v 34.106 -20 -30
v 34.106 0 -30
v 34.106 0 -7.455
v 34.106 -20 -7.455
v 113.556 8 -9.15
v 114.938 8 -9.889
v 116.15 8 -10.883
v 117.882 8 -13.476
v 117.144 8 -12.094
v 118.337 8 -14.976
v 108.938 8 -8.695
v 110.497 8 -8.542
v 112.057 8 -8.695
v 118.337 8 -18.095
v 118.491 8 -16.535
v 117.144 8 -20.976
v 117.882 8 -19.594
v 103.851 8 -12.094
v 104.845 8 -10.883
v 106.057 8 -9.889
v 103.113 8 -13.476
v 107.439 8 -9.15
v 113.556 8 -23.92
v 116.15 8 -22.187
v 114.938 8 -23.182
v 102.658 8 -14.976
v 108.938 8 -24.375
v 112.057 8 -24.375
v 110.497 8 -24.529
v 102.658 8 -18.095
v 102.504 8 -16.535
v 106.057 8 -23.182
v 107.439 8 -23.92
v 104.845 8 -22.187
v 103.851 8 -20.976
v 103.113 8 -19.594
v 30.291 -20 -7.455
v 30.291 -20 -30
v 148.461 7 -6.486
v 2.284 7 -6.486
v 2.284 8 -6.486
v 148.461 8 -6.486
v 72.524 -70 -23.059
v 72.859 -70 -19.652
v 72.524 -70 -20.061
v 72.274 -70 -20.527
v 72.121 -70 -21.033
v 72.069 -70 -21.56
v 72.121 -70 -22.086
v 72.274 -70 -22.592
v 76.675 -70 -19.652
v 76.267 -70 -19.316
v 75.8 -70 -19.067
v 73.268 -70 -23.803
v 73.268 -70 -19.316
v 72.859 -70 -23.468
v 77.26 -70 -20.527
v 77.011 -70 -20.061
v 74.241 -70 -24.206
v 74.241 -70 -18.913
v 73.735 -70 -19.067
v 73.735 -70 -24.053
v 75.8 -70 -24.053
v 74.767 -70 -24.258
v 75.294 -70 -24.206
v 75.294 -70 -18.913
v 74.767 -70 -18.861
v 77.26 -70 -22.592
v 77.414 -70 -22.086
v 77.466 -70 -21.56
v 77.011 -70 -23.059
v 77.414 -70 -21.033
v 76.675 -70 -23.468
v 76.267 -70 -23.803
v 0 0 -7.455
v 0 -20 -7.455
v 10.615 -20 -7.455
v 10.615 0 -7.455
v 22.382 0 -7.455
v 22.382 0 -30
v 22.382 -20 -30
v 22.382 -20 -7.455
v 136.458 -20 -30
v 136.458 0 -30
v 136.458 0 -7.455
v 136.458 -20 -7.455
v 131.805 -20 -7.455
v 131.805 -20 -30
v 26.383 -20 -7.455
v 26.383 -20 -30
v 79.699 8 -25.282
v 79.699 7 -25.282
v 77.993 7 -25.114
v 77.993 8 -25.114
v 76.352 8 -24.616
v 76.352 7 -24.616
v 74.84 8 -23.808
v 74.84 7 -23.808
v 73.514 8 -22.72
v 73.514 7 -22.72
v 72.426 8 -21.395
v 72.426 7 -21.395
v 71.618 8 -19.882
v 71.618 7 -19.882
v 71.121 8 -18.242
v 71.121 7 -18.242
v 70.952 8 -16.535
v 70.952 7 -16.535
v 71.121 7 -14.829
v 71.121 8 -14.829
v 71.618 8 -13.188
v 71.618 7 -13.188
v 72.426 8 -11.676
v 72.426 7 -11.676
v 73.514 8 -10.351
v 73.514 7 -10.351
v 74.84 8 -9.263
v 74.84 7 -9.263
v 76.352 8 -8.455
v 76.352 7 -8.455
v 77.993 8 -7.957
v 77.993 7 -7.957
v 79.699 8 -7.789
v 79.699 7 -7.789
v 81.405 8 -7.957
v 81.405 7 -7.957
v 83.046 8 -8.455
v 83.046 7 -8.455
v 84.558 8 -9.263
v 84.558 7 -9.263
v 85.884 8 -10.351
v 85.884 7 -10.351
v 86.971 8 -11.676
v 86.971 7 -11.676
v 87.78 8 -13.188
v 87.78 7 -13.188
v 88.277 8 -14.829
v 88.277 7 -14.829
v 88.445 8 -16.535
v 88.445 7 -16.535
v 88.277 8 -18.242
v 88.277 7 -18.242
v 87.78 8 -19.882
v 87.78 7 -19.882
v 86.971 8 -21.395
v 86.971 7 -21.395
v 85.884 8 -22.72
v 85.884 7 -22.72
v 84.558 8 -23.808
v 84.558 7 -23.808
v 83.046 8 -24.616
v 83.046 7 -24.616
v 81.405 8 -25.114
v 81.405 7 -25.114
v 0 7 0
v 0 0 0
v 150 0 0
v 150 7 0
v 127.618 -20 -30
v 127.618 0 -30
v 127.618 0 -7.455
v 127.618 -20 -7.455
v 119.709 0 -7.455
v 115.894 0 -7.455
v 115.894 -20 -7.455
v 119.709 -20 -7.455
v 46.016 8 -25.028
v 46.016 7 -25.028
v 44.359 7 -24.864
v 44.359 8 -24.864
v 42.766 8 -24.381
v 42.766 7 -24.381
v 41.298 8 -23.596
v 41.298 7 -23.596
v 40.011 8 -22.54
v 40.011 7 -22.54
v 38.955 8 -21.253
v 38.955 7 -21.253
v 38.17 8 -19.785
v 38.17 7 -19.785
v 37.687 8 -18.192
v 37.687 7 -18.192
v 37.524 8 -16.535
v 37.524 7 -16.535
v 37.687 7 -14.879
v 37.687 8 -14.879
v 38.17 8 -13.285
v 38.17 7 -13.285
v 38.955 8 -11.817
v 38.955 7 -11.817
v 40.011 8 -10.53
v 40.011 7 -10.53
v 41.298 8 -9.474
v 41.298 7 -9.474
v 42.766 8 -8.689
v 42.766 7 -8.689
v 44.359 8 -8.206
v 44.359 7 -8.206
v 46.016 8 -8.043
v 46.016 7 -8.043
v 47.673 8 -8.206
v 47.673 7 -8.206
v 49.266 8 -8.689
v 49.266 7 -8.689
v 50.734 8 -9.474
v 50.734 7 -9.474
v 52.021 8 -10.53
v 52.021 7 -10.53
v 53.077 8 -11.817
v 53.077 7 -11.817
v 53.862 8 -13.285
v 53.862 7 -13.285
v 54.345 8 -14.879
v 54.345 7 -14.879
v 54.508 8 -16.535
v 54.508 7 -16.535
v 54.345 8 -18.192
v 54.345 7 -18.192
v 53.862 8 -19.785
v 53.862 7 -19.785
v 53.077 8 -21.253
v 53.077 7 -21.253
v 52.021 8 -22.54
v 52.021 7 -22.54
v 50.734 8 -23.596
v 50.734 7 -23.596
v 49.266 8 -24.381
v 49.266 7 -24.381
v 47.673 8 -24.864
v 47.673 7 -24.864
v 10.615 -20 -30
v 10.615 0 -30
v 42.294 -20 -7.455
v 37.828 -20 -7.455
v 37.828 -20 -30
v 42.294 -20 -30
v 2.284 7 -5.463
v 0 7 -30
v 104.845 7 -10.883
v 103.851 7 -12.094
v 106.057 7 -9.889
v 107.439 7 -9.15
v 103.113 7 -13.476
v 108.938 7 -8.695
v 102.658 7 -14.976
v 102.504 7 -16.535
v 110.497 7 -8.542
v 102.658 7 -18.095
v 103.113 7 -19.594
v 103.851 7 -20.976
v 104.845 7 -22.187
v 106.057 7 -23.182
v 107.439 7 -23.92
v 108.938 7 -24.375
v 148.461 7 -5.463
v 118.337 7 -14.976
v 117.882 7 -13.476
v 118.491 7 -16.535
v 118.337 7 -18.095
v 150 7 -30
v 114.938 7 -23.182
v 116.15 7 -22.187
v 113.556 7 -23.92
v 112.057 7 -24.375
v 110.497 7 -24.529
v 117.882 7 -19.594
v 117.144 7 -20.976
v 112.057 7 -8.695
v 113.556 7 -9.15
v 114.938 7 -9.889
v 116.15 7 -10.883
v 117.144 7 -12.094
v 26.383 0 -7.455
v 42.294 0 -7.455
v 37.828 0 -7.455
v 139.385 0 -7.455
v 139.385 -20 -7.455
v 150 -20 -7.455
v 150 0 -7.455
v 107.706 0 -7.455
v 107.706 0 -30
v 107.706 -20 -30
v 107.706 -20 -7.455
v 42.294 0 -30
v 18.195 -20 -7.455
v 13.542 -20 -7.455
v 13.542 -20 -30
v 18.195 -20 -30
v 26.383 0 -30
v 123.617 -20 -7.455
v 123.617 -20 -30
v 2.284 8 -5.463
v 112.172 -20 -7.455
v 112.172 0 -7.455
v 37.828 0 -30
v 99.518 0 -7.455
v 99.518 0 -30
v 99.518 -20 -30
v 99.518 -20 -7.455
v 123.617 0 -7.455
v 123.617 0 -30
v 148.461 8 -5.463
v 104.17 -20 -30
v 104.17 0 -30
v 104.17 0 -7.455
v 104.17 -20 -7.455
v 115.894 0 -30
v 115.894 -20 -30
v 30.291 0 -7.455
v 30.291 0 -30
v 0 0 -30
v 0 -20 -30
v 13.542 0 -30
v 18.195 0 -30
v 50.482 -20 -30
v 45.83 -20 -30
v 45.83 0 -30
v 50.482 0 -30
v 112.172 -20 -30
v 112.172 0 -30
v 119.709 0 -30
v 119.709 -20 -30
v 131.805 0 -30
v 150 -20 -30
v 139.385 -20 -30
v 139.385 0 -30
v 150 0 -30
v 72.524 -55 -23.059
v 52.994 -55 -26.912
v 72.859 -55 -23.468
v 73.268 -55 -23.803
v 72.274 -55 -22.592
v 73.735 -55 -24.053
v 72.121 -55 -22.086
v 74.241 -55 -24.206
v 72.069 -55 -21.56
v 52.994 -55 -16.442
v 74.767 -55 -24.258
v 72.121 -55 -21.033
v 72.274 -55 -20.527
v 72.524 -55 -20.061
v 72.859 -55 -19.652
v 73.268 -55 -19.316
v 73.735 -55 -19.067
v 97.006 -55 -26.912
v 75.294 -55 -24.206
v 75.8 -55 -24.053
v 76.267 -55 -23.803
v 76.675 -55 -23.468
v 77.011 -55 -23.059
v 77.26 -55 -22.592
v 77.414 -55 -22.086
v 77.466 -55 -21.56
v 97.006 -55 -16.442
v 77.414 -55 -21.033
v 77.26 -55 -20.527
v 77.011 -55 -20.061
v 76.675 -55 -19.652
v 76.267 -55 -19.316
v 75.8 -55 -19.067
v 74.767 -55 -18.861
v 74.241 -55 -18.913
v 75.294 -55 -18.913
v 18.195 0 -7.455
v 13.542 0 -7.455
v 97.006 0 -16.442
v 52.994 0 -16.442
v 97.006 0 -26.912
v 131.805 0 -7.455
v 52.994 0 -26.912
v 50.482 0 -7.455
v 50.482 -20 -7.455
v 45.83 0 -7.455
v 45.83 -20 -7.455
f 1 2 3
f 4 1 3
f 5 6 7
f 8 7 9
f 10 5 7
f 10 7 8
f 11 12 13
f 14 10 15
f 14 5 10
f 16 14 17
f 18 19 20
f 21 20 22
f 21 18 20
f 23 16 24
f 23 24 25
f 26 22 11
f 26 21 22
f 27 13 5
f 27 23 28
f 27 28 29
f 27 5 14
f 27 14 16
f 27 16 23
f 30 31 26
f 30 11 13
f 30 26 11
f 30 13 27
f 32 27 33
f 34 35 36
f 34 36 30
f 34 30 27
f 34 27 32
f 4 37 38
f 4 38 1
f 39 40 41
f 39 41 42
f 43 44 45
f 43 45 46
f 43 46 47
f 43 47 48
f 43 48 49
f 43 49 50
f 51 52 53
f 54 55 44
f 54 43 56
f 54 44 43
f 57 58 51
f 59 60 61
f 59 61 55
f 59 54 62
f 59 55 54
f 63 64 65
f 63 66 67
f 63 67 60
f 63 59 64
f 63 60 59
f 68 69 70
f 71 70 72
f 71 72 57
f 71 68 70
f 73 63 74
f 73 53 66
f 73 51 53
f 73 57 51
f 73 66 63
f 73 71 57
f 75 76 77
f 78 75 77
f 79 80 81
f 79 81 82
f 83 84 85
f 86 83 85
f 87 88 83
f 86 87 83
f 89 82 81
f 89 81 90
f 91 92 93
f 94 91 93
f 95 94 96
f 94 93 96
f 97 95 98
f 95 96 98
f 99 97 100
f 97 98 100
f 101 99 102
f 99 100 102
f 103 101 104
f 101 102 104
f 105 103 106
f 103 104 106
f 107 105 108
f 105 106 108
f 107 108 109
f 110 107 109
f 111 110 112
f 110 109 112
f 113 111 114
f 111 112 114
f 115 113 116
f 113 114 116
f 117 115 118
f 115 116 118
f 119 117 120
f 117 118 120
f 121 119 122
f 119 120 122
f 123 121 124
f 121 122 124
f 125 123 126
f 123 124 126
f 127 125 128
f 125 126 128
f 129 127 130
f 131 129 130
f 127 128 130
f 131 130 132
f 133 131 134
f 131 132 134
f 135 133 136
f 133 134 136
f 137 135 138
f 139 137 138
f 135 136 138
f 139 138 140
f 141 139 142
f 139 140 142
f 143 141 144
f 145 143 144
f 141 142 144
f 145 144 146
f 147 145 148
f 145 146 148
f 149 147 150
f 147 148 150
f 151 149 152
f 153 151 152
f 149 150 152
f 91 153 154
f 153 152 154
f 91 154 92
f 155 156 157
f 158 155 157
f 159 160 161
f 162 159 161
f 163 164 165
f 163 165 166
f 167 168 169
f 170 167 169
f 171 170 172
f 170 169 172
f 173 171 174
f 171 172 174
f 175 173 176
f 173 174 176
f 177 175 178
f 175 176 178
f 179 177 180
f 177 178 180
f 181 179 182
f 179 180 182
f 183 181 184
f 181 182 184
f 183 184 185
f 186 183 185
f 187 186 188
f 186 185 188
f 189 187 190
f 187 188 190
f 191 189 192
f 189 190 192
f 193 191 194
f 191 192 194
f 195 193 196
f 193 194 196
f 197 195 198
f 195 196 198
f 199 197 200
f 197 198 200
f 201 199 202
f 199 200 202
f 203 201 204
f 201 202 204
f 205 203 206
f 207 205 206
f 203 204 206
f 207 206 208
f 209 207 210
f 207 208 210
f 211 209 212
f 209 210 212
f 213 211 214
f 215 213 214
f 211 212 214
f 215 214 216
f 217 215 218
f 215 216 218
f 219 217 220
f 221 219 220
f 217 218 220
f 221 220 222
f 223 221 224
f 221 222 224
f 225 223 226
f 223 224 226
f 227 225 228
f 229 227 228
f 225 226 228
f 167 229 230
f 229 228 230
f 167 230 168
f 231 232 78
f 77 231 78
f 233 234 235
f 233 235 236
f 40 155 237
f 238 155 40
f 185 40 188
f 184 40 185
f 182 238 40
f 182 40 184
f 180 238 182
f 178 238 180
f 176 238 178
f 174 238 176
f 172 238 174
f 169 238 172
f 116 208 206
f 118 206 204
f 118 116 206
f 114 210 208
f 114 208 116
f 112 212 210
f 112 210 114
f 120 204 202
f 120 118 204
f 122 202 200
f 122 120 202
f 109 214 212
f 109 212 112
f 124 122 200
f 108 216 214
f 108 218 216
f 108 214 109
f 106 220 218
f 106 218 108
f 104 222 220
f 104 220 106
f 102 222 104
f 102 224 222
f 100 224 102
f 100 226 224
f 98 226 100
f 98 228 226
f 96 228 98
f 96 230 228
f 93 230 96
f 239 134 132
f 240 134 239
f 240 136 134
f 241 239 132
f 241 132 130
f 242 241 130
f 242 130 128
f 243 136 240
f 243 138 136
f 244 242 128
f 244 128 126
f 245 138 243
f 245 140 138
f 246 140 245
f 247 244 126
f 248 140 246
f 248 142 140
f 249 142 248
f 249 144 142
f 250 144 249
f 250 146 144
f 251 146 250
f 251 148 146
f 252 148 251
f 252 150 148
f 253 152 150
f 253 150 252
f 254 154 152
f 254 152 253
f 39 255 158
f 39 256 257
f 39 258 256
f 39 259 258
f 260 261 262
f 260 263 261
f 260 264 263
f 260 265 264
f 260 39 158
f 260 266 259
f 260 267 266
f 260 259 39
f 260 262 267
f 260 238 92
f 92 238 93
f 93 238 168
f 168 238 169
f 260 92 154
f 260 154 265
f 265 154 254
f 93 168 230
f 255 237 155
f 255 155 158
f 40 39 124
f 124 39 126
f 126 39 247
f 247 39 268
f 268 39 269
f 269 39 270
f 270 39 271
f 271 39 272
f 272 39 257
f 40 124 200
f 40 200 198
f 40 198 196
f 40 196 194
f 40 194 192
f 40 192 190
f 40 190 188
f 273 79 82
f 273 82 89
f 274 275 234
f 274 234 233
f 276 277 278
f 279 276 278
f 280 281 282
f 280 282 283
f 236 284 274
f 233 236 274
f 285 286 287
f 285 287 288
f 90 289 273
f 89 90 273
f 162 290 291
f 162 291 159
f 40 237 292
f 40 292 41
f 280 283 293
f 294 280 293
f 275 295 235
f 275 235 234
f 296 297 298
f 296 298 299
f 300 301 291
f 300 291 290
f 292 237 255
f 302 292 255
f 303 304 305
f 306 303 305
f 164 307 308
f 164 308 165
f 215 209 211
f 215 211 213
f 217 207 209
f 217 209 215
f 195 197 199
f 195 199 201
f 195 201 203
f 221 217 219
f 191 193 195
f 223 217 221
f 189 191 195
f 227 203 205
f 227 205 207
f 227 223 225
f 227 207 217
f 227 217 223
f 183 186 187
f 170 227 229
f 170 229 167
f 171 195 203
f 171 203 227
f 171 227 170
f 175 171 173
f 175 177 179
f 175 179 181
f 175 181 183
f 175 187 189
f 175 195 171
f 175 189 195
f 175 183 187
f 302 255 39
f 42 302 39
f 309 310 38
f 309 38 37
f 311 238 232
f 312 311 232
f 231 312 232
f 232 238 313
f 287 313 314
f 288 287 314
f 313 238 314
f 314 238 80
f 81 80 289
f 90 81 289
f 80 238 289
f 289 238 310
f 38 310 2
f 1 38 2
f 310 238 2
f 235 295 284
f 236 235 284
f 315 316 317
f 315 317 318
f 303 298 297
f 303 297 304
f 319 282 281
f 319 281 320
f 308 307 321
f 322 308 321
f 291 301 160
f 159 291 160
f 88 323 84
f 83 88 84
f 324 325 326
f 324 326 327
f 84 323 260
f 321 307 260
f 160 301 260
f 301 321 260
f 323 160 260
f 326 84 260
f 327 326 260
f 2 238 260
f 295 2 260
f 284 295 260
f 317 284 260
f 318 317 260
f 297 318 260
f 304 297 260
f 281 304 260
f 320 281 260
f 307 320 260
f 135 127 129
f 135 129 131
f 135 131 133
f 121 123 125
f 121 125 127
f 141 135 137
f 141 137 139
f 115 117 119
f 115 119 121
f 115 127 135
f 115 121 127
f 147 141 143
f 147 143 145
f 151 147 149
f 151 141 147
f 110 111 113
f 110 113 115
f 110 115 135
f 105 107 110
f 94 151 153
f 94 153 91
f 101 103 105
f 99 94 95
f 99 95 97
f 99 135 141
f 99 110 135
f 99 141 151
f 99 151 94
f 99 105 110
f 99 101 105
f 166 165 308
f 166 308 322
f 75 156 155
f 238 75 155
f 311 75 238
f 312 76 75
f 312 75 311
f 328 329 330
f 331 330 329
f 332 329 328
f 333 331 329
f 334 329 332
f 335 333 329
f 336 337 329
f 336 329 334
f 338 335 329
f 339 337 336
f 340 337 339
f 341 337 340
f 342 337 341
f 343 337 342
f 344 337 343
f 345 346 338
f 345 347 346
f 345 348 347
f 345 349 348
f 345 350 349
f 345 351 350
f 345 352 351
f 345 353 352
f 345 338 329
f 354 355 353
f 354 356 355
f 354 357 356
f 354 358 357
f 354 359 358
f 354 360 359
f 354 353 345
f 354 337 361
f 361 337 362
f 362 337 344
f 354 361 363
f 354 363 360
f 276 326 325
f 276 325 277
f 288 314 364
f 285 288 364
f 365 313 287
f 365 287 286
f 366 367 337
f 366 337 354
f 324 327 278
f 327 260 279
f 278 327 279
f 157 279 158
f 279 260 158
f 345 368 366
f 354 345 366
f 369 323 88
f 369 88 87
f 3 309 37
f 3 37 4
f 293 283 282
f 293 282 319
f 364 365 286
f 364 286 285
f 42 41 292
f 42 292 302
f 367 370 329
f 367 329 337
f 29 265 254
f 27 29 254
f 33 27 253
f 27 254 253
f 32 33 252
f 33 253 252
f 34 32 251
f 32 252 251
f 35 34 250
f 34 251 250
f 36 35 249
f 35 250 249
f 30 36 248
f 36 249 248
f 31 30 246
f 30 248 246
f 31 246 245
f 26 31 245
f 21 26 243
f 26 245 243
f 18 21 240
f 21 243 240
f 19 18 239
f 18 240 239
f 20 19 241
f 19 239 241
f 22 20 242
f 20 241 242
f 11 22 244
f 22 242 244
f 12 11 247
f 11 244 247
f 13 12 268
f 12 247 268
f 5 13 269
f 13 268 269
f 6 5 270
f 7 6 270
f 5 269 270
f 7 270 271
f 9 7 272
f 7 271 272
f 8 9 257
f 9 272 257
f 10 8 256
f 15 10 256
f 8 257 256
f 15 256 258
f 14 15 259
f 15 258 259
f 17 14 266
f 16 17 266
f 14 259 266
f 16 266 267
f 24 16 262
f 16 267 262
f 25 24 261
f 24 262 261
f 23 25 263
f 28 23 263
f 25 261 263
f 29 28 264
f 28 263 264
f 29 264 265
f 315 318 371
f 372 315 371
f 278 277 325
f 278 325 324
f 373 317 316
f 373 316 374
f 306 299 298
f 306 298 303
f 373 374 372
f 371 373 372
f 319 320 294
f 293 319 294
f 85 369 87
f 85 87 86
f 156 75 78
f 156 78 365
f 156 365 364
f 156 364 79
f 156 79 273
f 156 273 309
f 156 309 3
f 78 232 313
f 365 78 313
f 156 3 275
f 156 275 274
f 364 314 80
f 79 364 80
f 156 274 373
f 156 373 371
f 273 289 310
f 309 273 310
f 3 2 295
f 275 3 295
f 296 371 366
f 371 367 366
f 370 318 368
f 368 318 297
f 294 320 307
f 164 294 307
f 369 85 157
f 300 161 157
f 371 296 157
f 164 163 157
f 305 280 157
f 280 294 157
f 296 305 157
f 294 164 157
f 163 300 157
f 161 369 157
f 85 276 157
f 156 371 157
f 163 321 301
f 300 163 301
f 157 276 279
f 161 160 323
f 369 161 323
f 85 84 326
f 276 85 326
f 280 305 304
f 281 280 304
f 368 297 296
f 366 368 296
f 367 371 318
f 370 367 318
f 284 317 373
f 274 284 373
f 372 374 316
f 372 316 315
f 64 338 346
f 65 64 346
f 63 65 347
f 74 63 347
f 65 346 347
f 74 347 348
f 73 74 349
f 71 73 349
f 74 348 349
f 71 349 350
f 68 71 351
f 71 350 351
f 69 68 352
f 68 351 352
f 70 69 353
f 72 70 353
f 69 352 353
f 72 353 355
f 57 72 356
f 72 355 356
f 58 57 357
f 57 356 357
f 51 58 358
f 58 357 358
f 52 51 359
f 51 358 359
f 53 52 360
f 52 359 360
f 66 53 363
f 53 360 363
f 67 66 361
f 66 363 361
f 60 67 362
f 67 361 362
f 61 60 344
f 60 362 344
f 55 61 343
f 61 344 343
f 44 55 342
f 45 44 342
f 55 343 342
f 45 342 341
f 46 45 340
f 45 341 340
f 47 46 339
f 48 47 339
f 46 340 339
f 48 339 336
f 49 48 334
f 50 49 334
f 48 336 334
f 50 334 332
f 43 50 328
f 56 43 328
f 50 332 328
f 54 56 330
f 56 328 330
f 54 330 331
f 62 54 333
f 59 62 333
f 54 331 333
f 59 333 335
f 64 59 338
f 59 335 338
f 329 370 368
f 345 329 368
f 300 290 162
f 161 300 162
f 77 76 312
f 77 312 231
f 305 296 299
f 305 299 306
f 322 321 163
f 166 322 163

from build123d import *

# Parameters (mm, degrees)
SKETCH1_W           = 150
SKETCH1_H           = 30
BOSS_EXTRUDE1_DEPTH = 7
SKETCH2_R           = 8.492301233
SKETCH2_R_2         = 8.746428368
SKETCH2_R_3         = 7.993391254
SKETCH2_W           = 146.177010272
SKETCH2_H           = 1.023518213
BOSS_EXTRUDE2_DEPTH = 1
SKETCH3_W           = 10.614560987
SKETCH3_H           = 22.545060987
SKETCH3_W_2         = 4.652355514
SKETCH3_W_3         = 4.001025742
SKETCH3_W_4         = 3.814931522
SKETCH3_W_5         = 4.466261294
SKETCH3_W_6         = 4.652355515
BOSS_EXTRUDE3_DEPTH = 20
SKETCH4_W           = 44.01124784
SKETCH4_H           = 10.469759529
BOSS_EXTRUDE4_DEPTH = 55
SKETCH5_R           = 2.698367098
BOSS_EXTRUDE5_DEPTH = 15


with BuildPart() as part:
    # Sketch1 → Boss-Extrude1 (new body)
    with BuildSketch(Plane(origin=(0, 0, 0), x_dir=(1, 0, 0), z_dir=(0, 1, 0))):
        with Locations((75, 15)):
            Rectangle(SKETCH1_W, SKETCH1_H)
    extrude(amount=BOSS_EXTRUDE1_DEPTH)

    # Sketch2 → Boss-Extrude2 (add)
    with BuildSketch(Plane(origin=(0, 7, 0), x_dir=(1, 0, 0), z_dir=(0, 1, 0))):
        with Locations(Location((46.015825143, 16.53527732, 0), (0, 0, 90))):
            Circle(SKETCH2_R)
        with Locations(Location((79.69887907, 16.53527732, 0), (0, 0, 90))):
            Circle(SKETCH2_R_2)
        with Locations(Location((110.497472577, 16.53527732, 0), (0, 0, 90))):
            Circle(SKETCH2_R_3)
        with Locations((75.372188441, 5.974430301)):
            Rectangle(SKETCH2_W, SKETCH2_H)
    extrude(amount=BOSS_EXTRUDE2_DEPTH)

    # Sketch3 → Boss-Extrude3 (add)
    with BuildSketch(Plane.XZ):
        with Locations((144.692719506, -18.727469507)):
            Rectangle(SKETCH3_W, SKETCH3_H)
        with Locations((134.131438592, -18.727469507)):
            Rectangle(SKETCH3_W_2, SKETCH3_H)
        with Locations((125.617628, -18.727469507)):
            Rectangle(SKETCH3_W_3, SKETCH3_H)
        with Locations((117.801670735, -18.727469507)):
            Rectangle(SKETCH3_W_4, SKETCH3_H)
        with Locations((109.939189915, -18.727469507)):
            Rectangle(SKETCH3_W_5, SKETCH3_H)
        with Locations((101.844091319, -18.727469507)):
            Rectangle(SKETCH3_W_6, SKETCH3_H)
        with Locations((48.155908681, -18.727469507)):
            Rectangle(SKETCH3_W_6, SKETCH3_H)
        with Locations((40.060810085, -18.727469507)):
            Rectangle(SKETCH3_W_5, SKETCH3_H)
        with Locations((32.198329265, -18.727469507)):
            Rectangle(SKETCH3_W_4, SKETCH3_H)
        with Locations((24.382372, -18.727469507)):
            Rectangle(SKETCH3_W_3, SKETCH3_H)
        with Locations((15.868561408, -18.727469507)):
            Rectangle(SKETCH3_W_2, SKETCH3_H)
        with Locations((5.307280494, -18.727469507)):
            Rectangle(SKETCH3_W, SKETCH3_H)
    extrude(amount=BOSS_EXTRUDE3_DEPTH)

    # Sketch4 → Boss-Extrude4 (add)
    with BuildSketch(Plane.XZ):
        with Locations((75, -21.677122954)):
            Rectangle(SKETCH4_W, SKETCH4_H)
    extrude(amount=BOSS_EXTRUDE4_DEPTH)

    # Sketch5 → Boss-Extrude5 (add)
    with BuildSketch(Plane.XZ.offset(55)):
        with Locations(Location((74.767407147, -21.559835962, 0), (0, 0, 270))):
            Circle(SKETCH5_R)
    extrude(amount=BOSS_EXTRUDE5_DEPTH)


solid = part.part
